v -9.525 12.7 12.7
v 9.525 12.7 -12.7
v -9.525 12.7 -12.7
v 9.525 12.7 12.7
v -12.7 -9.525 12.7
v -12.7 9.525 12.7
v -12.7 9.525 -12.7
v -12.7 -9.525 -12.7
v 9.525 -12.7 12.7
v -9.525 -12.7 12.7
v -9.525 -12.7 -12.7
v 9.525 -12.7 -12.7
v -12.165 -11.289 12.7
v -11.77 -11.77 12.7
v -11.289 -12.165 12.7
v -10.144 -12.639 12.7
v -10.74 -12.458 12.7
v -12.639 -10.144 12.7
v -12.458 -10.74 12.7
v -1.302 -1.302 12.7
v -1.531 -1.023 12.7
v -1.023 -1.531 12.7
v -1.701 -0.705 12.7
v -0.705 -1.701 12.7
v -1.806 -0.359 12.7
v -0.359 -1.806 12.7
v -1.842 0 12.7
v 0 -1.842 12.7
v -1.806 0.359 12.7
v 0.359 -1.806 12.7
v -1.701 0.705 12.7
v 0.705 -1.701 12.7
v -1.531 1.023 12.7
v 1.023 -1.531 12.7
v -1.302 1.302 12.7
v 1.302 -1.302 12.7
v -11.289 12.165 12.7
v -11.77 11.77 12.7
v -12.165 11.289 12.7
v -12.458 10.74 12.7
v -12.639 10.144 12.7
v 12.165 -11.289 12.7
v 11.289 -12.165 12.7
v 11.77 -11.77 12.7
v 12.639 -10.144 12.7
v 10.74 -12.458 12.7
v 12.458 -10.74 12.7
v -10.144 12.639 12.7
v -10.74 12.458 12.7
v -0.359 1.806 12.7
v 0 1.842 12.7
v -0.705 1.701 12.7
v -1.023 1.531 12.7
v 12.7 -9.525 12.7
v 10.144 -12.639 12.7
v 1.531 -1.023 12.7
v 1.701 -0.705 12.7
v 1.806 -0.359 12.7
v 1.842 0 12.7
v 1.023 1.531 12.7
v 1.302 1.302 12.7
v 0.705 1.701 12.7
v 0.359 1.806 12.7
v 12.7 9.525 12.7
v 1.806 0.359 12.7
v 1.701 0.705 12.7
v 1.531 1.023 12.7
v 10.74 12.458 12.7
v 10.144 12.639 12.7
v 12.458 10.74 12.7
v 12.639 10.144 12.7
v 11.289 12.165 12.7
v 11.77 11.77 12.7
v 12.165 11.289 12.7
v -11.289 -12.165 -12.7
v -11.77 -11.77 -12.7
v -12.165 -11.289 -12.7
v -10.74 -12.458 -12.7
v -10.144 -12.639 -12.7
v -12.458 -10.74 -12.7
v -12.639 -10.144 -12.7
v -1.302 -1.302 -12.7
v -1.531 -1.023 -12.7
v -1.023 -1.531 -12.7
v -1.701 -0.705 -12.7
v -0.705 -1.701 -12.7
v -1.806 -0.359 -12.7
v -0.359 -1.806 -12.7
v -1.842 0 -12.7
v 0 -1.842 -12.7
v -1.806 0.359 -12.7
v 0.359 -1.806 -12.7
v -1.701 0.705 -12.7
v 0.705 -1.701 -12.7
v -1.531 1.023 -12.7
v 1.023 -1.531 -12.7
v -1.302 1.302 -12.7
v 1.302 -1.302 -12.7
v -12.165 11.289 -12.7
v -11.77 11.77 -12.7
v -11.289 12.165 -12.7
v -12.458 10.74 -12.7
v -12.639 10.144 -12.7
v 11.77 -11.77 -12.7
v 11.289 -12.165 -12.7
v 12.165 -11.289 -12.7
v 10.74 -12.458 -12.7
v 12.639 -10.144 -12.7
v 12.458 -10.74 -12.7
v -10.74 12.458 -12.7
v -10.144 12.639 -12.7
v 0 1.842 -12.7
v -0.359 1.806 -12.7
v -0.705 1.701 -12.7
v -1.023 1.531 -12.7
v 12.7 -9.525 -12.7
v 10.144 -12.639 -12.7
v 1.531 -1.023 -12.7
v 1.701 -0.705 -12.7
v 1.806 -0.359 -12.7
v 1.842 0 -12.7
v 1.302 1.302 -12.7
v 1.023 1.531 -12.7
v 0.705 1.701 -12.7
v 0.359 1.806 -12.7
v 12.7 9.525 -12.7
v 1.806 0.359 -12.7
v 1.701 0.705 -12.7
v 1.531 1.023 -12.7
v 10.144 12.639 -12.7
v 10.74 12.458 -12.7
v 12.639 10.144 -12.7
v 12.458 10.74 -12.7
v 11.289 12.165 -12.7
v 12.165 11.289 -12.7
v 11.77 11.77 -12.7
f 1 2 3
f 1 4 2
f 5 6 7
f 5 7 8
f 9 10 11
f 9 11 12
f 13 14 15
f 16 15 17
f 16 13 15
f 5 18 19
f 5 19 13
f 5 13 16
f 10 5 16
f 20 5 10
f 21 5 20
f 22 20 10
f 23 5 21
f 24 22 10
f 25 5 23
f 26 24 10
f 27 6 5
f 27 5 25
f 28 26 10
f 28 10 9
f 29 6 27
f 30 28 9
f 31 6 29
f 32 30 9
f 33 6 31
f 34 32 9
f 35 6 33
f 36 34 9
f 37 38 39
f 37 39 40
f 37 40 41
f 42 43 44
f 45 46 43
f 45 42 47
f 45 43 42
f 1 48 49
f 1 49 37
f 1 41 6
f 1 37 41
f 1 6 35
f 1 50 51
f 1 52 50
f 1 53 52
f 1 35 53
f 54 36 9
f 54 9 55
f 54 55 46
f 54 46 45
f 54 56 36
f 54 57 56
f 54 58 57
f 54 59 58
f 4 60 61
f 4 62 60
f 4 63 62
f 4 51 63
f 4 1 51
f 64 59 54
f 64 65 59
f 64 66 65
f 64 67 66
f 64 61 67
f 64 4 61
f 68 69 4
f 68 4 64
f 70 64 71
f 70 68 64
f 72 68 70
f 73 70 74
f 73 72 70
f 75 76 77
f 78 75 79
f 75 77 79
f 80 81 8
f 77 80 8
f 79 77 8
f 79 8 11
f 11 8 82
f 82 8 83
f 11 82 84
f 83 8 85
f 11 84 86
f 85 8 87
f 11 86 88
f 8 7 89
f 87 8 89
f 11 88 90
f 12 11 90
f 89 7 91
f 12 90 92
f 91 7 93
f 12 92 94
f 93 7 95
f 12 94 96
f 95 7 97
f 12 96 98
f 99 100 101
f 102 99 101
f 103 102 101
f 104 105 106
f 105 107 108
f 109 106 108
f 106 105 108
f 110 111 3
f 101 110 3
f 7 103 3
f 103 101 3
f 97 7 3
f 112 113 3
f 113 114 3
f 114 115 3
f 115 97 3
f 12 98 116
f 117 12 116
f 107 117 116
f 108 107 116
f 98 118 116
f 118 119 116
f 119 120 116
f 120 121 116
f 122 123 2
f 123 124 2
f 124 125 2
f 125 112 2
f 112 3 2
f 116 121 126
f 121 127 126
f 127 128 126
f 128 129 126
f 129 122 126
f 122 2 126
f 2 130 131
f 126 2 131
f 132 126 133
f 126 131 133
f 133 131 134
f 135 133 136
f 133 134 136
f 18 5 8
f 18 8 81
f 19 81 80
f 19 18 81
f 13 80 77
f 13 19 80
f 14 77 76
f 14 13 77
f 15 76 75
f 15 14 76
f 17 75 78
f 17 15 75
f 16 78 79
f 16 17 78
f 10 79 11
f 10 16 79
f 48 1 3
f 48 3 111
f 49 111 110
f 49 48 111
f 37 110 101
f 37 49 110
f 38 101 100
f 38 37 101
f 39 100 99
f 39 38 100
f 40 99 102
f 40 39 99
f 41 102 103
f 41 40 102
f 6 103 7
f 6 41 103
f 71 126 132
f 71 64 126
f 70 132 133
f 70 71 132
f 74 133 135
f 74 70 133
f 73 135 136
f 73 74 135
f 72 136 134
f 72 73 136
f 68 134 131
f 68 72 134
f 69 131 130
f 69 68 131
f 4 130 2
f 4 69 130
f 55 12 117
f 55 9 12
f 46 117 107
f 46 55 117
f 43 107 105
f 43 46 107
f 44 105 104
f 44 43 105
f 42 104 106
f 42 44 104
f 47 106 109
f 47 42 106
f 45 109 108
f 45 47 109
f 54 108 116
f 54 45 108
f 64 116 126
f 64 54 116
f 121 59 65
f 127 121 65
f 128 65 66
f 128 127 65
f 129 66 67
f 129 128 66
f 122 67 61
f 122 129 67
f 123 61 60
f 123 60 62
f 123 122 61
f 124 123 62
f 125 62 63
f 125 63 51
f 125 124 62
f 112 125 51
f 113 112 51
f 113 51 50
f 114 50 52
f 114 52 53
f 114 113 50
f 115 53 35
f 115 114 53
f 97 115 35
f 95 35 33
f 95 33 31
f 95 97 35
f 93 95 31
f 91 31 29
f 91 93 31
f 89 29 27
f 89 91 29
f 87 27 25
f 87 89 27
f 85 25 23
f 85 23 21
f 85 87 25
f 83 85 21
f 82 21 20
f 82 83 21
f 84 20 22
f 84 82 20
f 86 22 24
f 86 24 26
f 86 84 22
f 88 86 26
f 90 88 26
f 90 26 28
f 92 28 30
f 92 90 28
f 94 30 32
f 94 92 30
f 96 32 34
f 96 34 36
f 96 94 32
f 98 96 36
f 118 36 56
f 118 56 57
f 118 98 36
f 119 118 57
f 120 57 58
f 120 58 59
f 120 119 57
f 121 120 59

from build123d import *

# Parameters (mm, degrees)
F0_R     = 1.8415
F1_DEPTH = 12.7


with BuildPart() as f1:
    # F0 (on Top) → F1 (new body, symmetric)
    with BuildSketch(Plane.XY):
        with BuildLine():
            Line((9.525, 12.7), (-9.525, 12.7))
            ThreePointArc((-9.525, 12.7), (-11.770064, 11.770064), (-12.7, 9.525))
            Line((-12.7, 9.525), (-12.7, -9.525))
            ThreePointArc((-12.7, -9.525), (-11.770064, -11.770064), (-9.525, -12.7))
            Line((-9.525, -12.7), (9.525, -12.7))
            ThreePointArc((9.525, -12.7), (11.770064, -11.770064), (12.7, -9.525))
            Line((12.7, -9.525), (12.7, 9.525))
            ThreePointArc((12.7, 9.525), (11.770064, 11.770064), (9.525, 12.7))
        make_face()
        Circle(F0_R, mode=Mode.SUBTRACT)
    extrude(amount=F1_DEPTH, both=True)


solid = f1.part
